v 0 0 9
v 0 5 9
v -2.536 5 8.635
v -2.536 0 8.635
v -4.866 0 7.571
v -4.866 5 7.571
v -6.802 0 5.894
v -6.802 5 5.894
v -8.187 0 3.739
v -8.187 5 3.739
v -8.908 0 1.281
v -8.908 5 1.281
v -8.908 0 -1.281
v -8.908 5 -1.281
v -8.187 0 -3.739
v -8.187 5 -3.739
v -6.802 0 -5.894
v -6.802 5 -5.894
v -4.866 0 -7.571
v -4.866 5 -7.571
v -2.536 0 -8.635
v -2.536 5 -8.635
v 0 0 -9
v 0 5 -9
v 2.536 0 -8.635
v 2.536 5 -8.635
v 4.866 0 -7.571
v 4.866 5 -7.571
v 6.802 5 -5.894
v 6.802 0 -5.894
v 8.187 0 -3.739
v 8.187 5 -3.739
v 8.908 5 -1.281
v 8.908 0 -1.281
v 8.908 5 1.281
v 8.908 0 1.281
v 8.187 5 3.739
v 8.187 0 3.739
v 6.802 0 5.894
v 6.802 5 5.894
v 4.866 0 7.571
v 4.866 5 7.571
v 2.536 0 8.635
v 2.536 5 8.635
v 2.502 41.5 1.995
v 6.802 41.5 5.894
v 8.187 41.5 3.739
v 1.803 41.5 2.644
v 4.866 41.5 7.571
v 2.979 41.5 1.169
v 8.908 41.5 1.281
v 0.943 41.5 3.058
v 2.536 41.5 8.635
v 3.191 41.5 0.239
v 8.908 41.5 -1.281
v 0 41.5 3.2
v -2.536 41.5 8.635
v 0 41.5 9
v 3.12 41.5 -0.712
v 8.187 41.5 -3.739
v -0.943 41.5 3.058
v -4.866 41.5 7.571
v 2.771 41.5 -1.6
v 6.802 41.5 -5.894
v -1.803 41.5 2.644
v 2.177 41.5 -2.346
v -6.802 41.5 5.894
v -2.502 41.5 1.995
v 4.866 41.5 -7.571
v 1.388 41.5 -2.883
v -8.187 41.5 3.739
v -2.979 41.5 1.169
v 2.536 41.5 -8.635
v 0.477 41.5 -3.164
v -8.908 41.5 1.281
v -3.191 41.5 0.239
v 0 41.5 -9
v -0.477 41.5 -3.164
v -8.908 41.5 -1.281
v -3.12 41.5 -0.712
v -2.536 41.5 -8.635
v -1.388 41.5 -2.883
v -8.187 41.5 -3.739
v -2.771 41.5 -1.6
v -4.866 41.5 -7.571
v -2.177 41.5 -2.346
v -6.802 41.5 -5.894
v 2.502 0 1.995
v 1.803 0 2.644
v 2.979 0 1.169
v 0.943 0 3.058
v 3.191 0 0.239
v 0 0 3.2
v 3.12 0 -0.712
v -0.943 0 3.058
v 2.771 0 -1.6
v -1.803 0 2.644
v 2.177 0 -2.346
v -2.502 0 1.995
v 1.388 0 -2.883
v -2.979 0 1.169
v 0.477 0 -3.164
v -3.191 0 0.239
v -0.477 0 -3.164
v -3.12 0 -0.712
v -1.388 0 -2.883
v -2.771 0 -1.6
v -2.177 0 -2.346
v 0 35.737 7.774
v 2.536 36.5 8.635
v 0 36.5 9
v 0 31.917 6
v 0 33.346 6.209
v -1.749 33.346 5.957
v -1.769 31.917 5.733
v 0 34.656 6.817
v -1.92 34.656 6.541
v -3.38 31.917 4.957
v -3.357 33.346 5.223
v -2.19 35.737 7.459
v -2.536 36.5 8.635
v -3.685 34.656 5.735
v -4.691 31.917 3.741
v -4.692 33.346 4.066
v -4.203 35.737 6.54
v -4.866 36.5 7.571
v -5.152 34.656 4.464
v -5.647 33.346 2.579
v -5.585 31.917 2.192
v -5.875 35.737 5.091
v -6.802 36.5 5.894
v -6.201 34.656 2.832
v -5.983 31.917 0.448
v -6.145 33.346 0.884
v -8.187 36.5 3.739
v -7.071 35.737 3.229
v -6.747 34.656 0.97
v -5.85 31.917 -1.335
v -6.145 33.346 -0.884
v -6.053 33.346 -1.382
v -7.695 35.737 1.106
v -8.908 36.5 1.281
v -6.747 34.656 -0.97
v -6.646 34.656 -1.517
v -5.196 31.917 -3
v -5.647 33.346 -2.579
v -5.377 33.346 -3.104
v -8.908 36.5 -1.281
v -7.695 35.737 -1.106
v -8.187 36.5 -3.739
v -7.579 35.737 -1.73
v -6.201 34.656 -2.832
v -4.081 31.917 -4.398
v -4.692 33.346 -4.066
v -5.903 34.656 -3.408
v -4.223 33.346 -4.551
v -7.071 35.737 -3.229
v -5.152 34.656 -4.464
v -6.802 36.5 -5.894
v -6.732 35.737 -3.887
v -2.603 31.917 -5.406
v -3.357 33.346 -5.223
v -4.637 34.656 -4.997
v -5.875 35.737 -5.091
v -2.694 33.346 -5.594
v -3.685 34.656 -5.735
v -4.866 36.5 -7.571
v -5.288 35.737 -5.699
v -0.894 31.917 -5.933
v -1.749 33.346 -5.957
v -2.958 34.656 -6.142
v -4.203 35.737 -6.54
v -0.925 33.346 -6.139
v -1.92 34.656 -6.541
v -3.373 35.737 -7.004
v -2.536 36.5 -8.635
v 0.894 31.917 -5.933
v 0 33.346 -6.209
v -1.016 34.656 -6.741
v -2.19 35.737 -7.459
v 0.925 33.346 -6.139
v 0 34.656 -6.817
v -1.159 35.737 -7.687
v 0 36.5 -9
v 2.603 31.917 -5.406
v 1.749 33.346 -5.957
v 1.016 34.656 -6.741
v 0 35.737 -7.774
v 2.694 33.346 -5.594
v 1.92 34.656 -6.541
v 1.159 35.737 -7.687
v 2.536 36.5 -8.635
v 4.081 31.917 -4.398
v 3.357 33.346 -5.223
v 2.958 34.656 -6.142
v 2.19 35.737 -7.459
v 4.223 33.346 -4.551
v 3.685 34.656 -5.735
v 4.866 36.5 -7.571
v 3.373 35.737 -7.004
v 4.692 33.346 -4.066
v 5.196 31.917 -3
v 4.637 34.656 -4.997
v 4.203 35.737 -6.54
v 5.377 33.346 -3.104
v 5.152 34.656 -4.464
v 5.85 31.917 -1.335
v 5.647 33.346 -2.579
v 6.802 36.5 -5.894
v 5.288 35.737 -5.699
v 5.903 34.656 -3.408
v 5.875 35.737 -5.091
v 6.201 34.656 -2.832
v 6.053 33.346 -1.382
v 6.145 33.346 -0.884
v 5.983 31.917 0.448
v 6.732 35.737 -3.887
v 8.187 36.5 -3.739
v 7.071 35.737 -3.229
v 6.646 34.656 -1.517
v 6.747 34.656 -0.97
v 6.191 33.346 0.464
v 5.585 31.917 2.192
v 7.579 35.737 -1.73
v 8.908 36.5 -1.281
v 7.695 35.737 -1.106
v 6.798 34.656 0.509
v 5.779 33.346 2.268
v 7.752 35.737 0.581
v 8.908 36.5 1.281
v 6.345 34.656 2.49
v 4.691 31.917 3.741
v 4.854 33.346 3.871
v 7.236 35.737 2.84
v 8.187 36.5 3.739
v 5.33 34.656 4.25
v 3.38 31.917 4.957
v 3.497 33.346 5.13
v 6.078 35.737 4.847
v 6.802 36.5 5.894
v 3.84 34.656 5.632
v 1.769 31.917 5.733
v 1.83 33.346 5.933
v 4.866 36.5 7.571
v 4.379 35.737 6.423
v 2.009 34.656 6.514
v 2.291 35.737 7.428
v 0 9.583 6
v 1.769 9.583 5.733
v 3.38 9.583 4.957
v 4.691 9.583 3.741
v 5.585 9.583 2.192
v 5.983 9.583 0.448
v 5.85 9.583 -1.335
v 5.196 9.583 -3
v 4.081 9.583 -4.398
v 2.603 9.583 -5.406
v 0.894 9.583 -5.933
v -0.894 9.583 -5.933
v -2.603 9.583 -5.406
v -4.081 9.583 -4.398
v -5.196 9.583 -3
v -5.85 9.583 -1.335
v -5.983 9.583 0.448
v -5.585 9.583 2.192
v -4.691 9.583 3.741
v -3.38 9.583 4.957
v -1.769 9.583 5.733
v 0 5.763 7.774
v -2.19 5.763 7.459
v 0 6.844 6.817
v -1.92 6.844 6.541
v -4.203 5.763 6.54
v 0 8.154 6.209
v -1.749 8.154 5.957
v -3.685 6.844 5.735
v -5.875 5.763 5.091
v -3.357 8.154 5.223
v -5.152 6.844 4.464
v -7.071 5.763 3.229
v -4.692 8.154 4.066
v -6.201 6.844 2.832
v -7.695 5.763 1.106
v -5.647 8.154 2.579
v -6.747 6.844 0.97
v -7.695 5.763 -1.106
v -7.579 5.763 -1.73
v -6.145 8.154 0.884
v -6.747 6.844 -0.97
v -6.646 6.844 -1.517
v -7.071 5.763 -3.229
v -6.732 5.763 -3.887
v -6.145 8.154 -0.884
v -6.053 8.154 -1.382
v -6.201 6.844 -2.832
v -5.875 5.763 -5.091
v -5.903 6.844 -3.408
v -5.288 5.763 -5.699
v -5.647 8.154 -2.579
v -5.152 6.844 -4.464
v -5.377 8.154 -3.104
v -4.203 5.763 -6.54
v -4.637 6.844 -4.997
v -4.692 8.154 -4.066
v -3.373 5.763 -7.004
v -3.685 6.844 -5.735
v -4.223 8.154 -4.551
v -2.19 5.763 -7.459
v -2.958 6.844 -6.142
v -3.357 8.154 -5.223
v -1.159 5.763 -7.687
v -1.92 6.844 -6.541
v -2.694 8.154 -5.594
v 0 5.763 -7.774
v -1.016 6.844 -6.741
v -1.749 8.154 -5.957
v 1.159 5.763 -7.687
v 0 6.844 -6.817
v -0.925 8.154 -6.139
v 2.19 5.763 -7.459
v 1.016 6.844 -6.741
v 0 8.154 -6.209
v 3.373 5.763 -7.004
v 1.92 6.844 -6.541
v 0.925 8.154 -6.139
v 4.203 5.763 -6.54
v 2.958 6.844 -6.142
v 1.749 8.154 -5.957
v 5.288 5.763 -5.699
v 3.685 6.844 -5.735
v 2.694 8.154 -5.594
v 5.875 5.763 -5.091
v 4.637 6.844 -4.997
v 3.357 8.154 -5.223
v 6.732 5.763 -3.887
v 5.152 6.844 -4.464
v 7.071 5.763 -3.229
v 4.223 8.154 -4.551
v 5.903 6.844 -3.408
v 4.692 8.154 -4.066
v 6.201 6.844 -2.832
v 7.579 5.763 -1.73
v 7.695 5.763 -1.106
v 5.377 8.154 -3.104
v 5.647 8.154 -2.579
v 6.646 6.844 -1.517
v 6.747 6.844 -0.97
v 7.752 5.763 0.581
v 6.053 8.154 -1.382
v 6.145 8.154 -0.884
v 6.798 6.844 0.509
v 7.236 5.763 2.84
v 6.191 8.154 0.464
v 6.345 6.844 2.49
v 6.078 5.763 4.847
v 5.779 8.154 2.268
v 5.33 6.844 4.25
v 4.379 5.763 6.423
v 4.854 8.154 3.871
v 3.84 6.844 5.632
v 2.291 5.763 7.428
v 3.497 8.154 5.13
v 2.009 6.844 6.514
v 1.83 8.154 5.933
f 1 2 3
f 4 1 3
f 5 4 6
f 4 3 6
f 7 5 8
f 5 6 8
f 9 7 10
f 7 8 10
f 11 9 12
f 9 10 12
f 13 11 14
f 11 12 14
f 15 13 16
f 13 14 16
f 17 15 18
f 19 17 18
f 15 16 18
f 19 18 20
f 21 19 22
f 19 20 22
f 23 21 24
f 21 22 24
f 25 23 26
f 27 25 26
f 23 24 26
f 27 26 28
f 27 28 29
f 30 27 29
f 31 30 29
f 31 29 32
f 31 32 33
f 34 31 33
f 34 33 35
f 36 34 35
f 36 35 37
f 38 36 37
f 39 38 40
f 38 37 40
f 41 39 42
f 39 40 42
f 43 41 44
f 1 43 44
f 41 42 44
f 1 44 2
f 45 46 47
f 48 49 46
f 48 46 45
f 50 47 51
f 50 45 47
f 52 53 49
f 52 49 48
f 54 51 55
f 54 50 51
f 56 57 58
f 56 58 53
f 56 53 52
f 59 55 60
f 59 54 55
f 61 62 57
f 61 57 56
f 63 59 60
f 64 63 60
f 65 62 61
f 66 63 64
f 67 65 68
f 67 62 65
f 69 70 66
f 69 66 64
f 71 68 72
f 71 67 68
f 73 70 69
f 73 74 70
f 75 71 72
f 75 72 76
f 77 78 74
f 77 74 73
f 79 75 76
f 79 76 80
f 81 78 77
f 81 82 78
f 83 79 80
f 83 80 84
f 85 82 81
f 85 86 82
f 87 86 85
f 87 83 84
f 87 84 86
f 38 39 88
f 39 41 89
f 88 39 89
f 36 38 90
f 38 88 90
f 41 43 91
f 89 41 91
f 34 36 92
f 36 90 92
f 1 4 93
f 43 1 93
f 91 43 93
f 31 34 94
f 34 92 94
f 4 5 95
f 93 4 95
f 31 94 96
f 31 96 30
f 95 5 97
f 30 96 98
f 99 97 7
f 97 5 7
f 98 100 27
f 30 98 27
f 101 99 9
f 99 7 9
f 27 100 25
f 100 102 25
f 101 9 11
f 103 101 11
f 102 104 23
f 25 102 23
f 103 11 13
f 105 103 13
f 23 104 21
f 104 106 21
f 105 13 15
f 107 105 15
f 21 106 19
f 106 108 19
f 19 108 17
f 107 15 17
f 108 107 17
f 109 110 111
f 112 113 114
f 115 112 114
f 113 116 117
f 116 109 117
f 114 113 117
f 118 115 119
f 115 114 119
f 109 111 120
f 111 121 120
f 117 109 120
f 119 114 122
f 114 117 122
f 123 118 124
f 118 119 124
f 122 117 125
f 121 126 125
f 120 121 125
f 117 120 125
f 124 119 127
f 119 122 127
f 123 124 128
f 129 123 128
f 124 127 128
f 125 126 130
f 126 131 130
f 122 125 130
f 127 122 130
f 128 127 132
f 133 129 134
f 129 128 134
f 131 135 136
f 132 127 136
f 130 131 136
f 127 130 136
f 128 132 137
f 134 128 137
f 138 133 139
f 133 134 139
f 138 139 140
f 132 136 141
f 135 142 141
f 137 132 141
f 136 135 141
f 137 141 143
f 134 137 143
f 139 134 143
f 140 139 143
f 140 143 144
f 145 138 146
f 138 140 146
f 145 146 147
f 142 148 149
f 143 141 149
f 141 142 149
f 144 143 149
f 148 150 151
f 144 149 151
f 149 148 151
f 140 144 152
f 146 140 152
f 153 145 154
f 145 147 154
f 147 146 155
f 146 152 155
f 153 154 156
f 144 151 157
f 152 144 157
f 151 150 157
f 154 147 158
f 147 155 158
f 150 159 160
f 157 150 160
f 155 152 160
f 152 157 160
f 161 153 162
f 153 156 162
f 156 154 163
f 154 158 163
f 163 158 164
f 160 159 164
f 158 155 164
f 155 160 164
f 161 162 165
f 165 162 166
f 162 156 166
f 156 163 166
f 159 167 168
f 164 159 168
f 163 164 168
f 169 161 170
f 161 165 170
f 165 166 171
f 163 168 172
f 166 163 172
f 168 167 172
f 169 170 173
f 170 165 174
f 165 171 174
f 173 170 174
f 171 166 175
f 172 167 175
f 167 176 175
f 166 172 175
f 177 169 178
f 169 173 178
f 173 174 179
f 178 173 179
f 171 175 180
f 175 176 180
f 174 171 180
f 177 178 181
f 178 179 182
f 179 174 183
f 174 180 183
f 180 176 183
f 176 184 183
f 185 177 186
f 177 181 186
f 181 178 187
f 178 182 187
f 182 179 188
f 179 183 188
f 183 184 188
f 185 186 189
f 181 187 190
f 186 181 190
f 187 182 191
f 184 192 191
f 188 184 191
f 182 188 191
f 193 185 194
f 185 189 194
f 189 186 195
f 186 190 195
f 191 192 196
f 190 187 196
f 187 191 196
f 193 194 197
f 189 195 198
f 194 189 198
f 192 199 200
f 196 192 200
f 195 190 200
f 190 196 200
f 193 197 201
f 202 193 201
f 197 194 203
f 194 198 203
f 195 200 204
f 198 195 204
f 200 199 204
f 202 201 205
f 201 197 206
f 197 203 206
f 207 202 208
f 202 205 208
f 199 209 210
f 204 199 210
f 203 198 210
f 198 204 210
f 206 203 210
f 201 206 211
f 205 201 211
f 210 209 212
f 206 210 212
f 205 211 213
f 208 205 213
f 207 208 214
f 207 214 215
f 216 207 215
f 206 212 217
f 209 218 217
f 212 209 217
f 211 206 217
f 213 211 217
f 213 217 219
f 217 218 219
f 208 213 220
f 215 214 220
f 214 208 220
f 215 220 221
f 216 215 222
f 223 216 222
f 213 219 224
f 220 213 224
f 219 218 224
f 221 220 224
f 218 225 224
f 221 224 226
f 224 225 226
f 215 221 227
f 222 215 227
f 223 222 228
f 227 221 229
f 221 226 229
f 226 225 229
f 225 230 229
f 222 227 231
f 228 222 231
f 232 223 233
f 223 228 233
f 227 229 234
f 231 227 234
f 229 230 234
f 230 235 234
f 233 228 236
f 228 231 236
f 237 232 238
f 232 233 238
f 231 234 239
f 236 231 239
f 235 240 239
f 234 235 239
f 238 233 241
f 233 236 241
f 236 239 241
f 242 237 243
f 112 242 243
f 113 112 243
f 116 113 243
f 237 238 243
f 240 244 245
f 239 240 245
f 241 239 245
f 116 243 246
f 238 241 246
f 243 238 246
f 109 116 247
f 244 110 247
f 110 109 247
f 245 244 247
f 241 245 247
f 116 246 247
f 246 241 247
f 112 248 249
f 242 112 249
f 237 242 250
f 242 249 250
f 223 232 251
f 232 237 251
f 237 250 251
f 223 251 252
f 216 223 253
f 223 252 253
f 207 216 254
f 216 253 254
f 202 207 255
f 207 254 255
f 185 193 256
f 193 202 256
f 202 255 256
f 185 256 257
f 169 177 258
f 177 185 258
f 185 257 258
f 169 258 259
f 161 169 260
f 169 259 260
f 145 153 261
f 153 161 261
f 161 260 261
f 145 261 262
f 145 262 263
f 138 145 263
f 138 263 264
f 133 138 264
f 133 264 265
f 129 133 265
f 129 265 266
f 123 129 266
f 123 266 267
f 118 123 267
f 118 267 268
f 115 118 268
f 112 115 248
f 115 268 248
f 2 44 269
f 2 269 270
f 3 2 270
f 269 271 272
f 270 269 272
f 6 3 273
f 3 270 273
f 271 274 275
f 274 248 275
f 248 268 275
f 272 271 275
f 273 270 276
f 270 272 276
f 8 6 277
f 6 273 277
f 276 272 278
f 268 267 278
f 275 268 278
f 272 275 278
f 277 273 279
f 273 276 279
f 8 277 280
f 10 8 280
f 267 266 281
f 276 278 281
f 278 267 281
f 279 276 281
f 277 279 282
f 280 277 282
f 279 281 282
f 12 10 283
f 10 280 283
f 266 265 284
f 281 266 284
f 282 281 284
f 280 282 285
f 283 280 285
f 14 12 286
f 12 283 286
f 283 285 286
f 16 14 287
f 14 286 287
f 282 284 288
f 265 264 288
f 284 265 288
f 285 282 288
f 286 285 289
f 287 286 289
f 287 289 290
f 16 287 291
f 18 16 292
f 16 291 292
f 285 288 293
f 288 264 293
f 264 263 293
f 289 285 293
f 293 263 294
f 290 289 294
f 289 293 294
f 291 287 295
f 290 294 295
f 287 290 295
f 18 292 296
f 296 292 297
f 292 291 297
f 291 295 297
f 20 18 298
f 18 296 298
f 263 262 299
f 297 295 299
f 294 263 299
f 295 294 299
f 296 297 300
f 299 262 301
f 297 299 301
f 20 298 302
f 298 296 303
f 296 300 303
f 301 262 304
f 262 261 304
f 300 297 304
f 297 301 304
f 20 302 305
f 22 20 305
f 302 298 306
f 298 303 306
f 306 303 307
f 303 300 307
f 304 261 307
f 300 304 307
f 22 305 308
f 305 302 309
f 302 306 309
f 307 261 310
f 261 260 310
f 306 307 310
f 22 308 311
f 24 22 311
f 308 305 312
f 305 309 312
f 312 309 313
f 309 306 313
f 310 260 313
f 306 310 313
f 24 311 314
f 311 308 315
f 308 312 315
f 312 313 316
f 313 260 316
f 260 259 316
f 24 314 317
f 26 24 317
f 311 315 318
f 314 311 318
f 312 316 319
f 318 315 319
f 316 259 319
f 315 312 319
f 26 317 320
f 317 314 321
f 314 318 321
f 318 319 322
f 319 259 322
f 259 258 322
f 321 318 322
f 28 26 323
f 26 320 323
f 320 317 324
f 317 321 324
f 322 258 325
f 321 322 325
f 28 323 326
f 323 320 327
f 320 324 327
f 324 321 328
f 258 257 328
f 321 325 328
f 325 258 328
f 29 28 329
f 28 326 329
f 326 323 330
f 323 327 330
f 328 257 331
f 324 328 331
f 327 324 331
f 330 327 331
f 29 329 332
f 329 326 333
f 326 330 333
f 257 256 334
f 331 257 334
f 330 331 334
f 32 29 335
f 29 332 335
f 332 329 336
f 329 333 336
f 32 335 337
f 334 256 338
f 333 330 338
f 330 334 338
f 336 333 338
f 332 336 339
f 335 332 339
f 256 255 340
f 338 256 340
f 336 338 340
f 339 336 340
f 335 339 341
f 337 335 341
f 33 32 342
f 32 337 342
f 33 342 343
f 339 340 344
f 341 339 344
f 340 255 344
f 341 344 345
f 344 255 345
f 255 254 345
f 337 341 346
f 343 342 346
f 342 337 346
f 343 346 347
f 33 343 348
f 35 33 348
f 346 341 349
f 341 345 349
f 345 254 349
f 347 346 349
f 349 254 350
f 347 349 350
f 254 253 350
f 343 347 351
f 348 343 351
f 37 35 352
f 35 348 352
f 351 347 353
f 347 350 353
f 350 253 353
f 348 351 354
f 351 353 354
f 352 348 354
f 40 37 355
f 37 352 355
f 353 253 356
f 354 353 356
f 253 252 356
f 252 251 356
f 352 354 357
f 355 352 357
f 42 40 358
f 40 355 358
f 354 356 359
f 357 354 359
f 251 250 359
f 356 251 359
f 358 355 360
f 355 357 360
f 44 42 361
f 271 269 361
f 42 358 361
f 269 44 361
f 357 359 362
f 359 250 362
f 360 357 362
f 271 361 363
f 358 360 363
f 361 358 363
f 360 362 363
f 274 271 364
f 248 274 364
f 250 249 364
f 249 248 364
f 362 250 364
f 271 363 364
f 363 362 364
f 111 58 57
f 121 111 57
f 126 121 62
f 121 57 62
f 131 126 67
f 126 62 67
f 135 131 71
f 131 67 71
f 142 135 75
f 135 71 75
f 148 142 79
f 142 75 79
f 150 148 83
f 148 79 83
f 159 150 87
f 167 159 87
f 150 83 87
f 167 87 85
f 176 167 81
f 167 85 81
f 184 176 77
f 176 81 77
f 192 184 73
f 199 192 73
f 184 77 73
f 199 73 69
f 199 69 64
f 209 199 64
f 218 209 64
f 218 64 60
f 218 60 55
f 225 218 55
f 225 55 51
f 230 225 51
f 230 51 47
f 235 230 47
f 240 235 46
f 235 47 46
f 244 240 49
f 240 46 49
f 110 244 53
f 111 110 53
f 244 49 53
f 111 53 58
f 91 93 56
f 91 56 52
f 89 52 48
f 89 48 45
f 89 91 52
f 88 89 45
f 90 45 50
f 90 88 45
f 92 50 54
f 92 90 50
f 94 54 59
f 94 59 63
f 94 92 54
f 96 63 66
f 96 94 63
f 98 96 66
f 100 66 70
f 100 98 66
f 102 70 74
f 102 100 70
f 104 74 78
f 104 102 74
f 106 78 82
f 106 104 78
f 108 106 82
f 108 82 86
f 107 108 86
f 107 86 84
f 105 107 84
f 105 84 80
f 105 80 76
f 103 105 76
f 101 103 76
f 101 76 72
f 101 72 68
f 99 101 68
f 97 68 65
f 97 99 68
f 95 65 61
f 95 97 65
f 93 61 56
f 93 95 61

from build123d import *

# Parameters (mm, degrees)
SKETCH1_R           = 6
SKETCH1_R_2         = 3.2
BOSS_EXTRUDE1_DEPTH = 41.5
SKETCH2_W           = 3
SKETCH2_H           = 5
FILLET1_R           = 5


with BuildPart() as part:
    # Sketch1 → Boss-Extrude1 (new body)
    with BuildSketch(Plane(origin=(0, 0, 0), x_dir=(1, 0, 0), z_dir=(0, 1, 0))):
        with Locations(Location((0, 0, 0), (0, 0, 270))):
            Circle(SKETCH1_R)
        with Locations(Location((0, 0, 0), (0, 0, 270))):
            Circle(SKETCH1_R_2, mode=Mode.SUBTRACT)
    extrude(amount=BOSS_EXTRUDE1_DEPTH)

    # Sketch2 → Revolve1 (revolve)
    with BuildSketch(Plane.XY, mode=Mode.PRIVATE) as revolve1_sk:
        with Locations((7.5, 39)):
            Rectangle(SKETCH2_W, SKETCH2_H)
        with Locations((7.5, 2.5)):
            Rectangle(SKETCH2_W, SKETCH2_H)
    revolve(revolve1_sk.sketch.rotate(Axis((0, 42.288271676, 0), (0, -1, 0)), 90), axis=Axis((0, 42.288271676, 0), (0, -1, 0)))

    # Fillet1
    # the kernel refuses this fillet: 5 mm, written as the material it adds along each edge
    with BuildSketch(Plane(origin=(0, 5, 0), x_dir=(0, 0, 1), z_dir=(1, 0, 0))) as fillet1_piece_1:
        with BuildLine():
            CenterArc((11, -4.582575695), FILLET1_R, 113.578178478, 66.421821522)
            Line((9, 0), (8.96, 0.091651514))
            ThreePointArc((8.96, 0.091651514), (7.5, 0.1), (6, 0.1))
            Line((6, 0.1), (5.9, 0))
            Line((5.9, 0), (5.9, -4.582575695))
            Line((5.9, -4.582575695), (6, -4.582575695))
        make_face()
    revolve(axis=Axis((0, 5, 0), (0, -1, 0)))
    with BuildSketch(Plane(origin=(0, 36.5, 0), x_dir=(0, 0, 1), z_dir=(1, 0, 0))) as fillet1_piece_2:
        with BuildLine():
            CenterArc((11, 4.582575695), FILLET1_R, 180, 66.421821522)
            Line((9, 0), (8.96, -0.091651514))
            ThreePointArc((8.96, -0.091651514), (7.5, -0.1), (6, -0.1))
            Line((6, -0.1), (5.9, 0))
            Line((5.9, 0), (5.9, 4.582575695))
            Line((5.9, 4.582575695), (6, 4.582575695))
        make_face()
    revolve(axis=Axis((0, 36.5, 0), (0, -1, 0)))


solid = part.part
